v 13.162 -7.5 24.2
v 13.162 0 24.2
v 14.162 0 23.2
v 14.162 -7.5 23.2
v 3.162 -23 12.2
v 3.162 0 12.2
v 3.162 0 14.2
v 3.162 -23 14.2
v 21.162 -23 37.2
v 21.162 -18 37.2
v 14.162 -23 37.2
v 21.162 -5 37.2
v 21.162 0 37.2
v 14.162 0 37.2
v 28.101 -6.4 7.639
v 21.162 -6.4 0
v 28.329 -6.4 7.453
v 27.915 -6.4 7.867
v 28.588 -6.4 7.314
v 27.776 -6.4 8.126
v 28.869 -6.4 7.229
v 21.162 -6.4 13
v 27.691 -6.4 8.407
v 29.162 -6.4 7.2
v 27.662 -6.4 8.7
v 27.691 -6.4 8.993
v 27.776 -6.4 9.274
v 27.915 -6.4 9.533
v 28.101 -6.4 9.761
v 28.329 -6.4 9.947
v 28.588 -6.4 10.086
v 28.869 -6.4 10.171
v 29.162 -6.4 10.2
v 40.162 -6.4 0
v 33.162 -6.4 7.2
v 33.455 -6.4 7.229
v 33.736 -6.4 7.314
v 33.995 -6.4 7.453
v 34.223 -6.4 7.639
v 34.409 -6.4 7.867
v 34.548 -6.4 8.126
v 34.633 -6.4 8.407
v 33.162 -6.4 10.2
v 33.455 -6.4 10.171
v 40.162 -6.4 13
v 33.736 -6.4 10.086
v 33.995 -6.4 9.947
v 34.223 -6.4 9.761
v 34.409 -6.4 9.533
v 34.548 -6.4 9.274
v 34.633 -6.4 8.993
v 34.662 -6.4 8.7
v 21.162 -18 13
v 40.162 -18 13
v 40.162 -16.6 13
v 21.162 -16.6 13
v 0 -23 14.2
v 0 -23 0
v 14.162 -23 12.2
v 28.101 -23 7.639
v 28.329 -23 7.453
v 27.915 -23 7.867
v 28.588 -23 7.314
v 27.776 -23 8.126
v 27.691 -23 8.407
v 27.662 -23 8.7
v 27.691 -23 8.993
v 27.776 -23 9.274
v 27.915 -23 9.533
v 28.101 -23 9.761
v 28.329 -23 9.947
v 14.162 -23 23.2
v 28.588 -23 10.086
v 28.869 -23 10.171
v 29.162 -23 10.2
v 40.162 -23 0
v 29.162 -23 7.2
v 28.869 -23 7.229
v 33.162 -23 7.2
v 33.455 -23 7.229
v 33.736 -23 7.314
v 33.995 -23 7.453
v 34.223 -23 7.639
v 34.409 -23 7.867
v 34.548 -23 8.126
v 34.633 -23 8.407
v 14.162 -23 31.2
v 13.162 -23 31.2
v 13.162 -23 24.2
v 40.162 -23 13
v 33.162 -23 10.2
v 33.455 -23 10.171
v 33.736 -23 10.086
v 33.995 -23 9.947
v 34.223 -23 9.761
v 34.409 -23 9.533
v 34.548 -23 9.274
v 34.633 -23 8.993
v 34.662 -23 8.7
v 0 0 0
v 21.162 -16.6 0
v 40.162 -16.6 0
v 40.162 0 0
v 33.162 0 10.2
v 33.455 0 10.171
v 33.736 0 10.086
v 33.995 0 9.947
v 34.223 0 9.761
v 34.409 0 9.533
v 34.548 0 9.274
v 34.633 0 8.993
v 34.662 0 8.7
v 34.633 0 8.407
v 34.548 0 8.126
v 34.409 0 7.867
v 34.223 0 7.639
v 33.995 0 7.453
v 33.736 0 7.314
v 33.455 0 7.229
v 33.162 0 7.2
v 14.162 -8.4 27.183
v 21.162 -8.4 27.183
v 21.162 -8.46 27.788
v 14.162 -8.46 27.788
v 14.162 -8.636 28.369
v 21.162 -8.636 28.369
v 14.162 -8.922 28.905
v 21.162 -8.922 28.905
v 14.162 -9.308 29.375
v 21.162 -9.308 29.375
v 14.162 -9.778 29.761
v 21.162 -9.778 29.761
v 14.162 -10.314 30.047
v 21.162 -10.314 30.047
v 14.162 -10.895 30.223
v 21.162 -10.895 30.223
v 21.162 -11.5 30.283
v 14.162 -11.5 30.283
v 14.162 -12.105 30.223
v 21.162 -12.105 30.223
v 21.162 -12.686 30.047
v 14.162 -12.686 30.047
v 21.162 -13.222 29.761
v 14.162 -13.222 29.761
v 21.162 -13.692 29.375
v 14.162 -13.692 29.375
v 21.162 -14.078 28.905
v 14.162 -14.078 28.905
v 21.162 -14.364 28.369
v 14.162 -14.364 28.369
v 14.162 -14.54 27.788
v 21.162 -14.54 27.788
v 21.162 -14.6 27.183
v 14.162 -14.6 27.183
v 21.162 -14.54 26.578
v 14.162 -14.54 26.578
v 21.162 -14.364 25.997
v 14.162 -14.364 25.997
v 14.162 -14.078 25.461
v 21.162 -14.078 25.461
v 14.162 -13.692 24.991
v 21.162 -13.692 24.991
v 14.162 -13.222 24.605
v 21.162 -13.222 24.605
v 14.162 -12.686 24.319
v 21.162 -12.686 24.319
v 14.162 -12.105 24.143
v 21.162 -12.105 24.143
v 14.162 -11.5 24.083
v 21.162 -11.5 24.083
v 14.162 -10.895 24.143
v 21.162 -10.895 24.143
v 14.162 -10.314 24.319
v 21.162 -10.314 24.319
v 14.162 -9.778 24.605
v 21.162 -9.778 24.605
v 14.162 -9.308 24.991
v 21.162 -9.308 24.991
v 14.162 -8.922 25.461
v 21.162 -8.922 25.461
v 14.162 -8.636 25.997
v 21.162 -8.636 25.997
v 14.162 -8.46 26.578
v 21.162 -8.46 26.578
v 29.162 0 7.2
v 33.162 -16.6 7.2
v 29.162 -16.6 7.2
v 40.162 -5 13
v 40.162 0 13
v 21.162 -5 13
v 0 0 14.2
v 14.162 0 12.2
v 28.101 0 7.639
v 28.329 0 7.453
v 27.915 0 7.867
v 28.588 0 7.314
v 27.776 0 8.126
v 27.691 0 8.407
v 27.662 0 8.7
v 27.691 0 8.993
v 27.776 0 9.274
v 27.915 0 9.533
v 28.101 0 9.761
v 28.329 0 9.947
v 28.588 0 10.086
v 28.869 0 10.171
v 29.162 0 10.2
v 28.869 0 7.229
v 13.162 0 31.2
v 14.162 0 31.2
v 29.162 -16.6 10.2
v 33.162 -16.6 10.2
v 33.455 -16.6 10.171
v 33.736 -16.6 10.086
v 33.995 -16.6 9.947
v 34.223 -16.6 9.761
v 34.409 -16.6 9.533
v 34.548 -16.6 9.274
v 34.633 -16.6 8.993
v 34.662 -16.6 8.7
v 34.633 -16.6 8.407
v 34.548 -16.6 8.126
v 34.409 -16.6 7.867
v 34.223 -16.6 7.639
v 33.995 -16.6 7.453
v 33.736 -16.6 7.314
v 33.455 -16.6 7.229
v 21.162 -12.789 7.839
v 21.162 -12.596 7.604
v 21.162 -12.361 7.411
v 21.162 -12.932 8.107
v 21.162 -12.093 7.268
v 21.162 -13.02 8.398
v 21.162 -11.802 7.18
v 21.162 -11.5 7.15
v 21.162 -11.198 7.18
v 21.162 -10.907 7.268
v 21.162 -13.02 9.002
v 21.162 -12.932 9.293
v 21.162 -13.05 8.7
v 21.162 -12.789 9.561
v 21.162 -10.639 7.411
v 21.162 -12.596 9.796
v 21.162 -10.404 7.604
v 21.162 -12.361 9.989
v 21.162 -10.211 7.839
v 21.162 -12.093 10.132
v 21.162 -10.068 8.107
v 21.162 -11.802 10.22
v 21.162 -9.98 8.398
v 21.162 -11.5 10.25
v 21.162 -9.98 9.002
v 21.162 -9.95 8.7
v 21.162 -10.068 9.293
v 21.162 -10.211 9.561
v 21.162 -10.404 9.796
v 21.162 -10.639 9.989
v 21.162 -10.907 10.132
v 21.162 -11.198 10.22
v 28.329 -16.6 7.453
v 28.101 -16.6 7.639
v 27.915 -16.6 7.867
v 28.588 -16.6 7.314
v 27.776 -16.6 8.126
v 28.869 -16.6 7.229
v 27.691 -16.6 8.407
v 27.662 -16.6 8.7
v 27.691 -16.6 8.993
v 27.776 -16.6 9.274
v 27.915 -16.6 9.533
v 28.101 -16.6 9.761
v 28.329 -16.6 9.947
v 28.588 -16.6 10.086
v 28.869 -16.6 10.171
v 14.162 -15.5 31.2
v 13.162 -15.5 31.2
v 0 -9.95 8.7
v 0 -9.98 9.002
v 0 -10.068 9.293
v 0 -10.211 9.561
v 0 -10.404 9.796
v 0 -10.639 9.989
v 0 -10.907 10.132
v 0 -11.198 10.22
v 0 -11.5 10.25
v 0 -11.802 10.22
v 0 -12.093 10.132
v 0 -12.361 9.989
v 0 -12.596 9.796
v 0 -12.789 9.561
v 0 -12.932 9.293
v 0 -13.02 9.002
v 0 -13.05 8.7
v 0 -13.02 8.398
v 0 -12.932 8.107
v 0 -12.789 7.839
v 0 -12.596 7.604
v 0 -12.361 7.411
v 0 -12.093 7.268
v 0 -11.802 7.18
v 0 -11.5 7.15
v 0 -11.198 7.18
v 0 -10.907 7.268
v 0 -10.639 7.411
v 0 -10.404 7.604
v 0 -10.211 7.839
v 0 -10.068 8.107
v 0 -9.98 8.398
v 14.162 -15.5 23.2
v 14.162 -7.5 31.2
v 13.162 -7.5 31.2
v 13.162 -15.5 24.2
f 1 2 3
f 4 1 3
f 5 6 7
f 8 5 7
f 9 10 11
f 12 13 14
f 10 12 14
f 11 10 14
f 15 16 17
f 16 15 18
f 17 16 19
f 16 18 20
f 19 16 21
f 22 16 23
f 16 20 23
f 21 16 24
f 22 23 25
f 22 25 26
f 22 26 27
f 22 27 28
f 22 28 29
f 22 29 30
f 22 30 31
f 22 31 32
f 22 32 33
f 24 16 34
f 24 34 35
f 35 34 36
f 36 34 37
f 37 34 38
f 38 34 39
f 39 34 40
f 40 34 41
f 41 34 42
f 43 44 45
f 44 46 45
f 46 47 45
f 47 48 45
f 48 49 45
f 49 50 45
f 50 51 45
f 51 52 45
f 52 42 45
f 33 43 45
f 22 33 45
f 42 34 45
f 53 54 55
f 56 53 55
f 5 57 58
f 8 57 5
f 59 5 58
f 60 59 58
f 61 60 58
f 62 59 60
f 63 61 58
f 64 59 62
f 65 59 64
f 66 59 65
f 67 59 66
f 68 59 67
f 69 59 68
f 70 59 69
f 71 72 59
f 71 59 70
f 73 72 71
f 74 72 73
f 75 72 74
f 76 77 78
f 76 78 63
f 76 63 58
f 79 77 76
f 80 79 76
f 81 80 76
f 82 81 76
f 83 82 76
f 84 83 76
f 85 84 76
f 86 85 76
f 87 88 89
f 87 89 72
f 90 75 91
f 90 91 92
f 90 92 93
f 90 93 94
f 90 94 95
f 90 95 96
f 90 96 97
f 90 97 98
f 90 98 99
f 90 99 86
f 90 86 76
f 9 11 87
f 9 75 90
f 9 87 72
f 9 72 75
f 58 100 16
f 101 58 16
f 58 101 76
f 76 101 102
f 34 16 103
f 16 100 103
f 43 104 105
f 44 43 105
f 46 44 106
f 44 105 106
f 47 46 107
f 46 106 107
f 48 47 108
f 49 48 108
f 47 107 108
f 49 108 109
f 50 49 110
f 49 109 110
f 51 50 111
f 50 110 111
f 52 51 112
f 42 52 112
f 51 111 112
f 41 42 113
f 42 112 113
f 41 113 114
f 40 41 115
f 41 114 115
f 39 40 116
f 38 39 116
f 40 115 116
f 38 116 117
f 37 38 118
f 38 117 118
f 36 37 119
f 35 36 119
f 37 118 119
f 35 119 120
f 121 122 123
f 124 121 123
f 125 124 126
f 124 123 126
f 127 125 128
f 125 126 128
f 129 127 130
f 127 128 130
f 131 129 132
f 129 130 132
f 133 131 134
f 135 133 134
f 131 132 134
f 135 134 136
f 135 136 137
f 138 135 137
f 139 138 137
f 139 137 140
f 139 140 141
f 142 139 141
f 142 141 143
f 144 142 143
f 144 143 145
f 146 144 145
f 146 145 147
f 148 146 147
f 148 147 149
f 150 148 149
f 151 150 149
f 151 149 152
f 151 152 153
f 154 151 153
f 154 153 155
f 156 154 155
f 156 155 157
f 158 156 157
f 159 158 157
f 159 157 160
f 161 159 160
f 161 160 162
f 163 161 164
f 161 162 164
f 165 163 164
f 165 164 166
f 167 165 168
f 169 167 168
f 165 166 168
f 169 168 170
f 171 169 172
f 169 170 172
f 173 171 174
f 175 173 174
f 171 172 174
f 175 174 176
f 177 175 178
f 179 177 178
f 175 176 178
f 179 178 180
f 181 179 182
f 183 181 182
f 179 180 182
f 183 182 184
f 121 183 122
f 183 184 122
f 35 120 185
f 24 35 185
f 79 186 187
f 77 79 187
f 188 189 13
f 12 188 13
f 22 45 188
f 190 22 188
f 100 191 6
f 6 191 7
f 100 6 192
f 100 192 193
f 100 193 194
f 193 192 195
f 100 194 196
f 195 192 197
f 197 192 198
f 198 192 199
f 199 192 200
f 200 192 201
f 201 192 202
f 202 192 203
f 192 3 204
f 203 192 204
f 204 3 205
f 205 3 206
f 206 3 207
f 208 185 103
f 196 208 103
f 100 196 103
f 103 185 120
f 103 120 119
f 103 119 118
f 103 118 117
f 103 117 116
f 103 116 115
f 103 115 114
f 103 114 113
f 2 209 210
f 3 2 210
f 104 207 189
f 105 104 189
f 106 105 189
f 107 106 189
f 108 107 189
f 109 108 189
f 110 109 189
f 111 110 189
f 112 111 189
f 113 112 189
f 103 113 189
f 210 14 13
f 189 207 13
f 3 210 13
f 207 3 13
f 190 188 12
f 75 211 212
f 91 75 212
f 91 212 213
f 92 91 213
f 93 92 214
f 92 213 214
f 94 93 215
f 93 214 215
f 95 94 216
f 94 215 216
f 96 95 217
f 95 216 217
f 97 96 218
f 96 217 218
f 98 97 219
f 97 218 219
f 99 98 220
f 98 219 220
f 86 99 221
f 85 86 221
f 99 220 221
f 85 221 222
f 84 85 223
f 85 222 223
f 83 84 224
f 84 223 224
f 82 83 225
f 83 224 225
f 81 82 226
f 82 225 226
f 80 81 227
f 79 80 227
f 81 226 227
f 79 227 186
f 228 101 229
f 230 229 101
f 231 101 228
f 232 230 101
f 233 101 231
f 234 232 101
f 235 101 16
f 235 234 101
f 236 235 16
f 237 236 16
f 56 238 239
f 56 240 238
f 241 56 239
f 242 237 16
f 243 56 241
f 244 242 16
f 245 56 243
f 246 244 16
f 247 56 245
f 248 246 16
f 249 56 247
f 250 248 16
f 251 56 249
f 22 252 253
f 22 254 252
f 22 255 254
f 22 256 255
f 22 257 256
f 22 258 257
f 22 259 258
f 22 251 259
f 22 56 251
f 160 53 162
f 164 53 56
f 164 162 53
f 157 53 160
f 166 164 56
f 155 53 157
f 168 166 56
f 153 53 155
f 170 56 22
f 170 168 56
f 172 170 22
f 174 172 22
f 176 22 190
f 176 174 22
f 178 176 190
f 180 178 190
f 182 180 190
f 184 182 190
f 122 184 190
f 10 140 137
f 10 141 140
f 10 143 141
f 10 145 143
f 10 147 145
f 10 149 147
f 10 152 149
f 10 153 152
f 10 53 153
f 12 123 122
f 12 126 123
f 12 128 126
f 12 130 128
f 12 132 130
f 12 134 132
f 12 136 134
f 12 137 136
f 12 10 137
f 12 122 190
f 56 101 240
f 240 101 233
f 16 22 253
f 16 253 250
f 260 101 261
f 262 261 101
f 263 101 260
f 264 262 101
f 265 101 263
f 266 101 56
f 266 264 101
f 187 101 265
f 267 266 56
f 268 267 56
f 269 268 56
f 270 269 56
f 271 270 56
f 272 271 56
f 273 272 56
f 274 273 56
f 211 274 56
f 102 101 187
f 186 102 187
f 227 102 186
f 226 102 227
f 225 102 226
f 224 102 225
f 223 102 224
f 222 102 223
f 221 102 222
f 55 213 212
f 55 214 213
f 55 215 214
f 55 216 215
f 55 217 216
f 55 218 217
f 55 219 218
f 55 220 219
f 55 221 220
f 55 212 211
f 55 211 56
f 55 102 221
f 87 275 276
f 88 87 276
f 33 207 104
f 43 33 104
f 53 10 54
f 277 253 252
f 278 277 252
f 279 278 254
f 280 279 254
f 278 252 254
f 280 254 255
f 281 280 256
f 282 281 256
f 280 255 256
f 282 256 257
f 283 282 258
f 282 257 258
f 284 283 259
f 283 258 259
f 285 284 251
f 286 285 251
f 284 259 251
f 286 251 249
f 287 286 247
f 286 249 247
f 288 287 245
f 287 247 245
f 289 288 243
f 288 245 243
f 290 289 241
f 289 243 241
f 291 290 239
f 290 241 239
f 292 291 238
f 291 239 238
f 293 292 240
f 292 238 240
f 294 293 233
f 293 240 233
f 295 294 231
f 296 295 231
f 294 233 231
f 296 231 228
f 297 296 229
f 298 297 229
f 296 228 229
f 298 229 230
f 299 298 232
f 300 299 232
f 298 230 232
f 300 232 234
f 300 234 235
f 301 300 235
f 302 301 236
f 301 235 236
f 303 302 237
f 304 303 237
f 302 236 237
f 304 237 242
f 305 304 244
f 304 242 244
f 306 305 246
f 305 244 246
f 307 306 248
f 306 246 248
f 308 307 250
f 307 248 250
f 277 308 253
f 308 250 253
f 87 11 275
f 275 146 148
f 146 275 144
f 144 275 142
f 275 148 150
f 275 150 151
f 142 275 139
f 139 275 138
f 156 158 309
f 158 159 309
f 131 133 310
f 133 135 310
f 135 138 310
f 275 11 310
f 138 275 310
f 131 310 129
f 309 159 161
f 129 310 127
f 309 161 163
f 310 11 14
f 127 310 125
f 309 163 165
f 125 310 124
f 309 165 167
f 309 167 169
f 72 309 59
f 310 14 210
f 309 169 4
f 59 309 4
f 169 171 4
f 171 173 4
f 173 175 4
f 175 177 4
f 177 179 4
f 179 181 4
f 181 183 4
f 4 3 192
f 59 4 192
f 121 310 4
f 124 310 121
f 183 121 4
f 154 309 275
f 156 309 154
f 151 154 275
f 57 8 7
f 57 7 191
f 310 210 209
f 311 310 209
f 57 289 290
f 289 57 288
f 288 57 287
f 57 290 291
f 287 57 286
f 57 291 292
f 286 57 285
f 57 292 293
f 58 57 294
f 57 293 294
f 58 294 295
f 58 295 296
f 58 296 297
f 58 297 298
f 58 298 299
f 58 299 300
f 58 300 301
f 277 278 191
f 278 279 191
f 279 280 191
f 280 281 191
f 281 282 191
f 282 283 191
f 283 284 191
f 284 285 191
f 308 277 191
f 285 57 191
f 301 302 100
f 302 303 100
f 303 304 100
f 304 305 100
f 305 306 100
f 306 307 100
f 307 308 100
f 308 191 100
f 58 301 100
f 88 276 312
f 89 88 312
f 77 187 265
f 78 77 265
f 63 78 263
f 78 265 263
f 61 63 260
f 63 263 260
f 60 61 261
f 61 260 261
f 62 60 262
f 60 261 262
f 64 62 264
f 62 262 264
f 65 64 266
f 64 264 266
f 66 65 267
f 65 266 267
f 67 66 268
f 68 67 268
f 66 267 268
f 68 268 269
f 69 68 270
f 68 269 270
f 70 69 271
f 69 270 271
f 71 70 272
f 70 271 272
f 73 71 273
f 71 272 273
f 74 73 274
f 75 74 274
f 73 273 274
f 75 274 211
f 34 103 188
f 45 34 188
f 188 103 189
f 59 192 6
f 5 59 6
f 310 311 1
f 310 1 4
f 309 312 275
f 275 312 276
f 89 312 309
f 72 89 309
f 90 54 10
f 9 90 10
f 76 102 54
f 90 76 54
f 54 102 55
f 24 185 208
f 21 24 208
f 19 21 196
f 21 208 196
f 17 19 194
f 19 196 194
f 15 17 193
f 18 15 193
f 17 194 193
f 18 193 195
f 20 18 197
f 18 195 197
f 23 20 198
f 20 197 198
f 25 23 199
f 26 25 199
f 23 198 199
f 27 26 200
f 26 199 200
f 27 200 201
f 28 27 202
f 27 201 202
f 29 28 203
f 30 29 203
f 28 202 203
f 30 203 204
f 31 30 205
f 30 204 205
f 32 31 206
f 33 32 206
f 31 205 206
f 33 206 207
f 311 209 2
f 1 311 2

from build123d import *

# Parameters (mm, degrees)
F1_DEPTH = 23
F2_W     = 10.2
F2_H     = 13
F3_DEPTH = 19
F4_R     = 3.1
F5_DEPTH = 8
F7_DEPTH = 1
F8_R     = 1.55
F9_DEPTH = 21.162


with BuildPart() as f1:
    # F0 (on Front) → F1 (new body)
    with BuildSketch(Plane.XZ):
        Polygon((0, 14.2), (0, 0), (40.162, 0), (40.162, 13), (21.162, 37.2), (14.162, 37.2), (14.162, 31.2), (13.162, 31.2), (13.162, 24.2), (14.162, 23.2), (14.162, 12.2), (3.162, 12.2), (3.162, 14.2), align=None)
        with BuildLine():
            ThreePointArc((33.162, 10.2), (34.662, 8.7), (33.162, 7.2))
            Line((33.162, 7.2), (29.162, 7.2))
            ThreePointArc((29.162, 7.2), (27.662, 8.7), (29.162, 10.2))
            Line((29.162, 10.2), (33.162, 10.2))
        make_face(mode=Mode.SUBTRACT)
    extrude(amount=F1_DEPTH)

    # F2 (on face) → F3 (cut)
    with BuildSketch(Plane.YZ.offset(40.162)):
        Polygon((-18, 13), (-16.6, 13), (-6.4, 13), (-5, 13), (-5, 37.2), (-18, 37.2), align=None)
        with Locations((-11.5, 6.5)):
            Rectangle(F2_W, F2_H)
    extrude(amount=-F3_DEPTH, mode=Mode.SUBTRACT)

    # F4 (on face) → F5 (cut, through all)
    with BuildSketch(Plane.YZ.offset(21.162)):
        with Locations((-11.5, 27.183)):
            Circle(F4_R)
    extrude(amount=-F5_DEPTH, mode=Mode.SUBTRACT)

    # F6 (on face) → F7 (cut, through all)
    with BuildSketch(Plane(origin=(13.162, 0, 0), x_dir=(0, -1, 0), z_dir=(-1, 0, 0))):
        with BuildLine():
            Line((15.5000005274, 31.2), (7.5000005274, 31.2))
            Line((7.5000005274, 31.2), (7.5000005274, 24.2))
            Line((7.5000005274, 24.2), (10.6563703419, 24.2))
            ThreePointArc((10.6563703419, 24.2), (9.0276274613, 25.3128732583), (8.4, 27.183))
            ThreePointArc((8.4, 27.183), (13.3701267417, 29.6553725387), (12.3436296581, 24.2))
            Line((12.3436296581, 24.2), (15.5000005274, 24.2))
            Line((15.5000005274, 24.2), (15.5000005274, 31.2))
        make_face()
        with BuildLine():
            Line((10.6563703419, 24.2), (7.5000005274, 24.2))
            Line((7.5000005274, 24.2), (7.5000005274, 23.2))
            Line((7.5000005274, 23.2), (15.5000005274, 23.2))
            Line((15.5000005274, 23.2), (15.5000005274, 24.2))
            Line((15.5000005274, 24.2), (12.3436296581, 24.2))
            ThreePointArc((12.3436296581, 24.2), (13.3701267417, 29.6553725387), (8.4, 27.183))
            ThreePointArc((8.4, 27.183), (9.0276274613, 25.3128732583), (10.6563703419, 24.2))
        make_face()
    extrude(amount=-F7_DEPTH, mode=Mode.SUBTRACT)

    # F8 (on face) → F9 (cut, through all)
    with BuildSketch(Plane.YZ.offset(21.162)):
        with Locations((-11.5, 8.7000000016)):
            Circle(F8_R)
    extrude(amount=-F9_DEPTH, mode=Mode.SUBTRACT)


solid = f1.part
